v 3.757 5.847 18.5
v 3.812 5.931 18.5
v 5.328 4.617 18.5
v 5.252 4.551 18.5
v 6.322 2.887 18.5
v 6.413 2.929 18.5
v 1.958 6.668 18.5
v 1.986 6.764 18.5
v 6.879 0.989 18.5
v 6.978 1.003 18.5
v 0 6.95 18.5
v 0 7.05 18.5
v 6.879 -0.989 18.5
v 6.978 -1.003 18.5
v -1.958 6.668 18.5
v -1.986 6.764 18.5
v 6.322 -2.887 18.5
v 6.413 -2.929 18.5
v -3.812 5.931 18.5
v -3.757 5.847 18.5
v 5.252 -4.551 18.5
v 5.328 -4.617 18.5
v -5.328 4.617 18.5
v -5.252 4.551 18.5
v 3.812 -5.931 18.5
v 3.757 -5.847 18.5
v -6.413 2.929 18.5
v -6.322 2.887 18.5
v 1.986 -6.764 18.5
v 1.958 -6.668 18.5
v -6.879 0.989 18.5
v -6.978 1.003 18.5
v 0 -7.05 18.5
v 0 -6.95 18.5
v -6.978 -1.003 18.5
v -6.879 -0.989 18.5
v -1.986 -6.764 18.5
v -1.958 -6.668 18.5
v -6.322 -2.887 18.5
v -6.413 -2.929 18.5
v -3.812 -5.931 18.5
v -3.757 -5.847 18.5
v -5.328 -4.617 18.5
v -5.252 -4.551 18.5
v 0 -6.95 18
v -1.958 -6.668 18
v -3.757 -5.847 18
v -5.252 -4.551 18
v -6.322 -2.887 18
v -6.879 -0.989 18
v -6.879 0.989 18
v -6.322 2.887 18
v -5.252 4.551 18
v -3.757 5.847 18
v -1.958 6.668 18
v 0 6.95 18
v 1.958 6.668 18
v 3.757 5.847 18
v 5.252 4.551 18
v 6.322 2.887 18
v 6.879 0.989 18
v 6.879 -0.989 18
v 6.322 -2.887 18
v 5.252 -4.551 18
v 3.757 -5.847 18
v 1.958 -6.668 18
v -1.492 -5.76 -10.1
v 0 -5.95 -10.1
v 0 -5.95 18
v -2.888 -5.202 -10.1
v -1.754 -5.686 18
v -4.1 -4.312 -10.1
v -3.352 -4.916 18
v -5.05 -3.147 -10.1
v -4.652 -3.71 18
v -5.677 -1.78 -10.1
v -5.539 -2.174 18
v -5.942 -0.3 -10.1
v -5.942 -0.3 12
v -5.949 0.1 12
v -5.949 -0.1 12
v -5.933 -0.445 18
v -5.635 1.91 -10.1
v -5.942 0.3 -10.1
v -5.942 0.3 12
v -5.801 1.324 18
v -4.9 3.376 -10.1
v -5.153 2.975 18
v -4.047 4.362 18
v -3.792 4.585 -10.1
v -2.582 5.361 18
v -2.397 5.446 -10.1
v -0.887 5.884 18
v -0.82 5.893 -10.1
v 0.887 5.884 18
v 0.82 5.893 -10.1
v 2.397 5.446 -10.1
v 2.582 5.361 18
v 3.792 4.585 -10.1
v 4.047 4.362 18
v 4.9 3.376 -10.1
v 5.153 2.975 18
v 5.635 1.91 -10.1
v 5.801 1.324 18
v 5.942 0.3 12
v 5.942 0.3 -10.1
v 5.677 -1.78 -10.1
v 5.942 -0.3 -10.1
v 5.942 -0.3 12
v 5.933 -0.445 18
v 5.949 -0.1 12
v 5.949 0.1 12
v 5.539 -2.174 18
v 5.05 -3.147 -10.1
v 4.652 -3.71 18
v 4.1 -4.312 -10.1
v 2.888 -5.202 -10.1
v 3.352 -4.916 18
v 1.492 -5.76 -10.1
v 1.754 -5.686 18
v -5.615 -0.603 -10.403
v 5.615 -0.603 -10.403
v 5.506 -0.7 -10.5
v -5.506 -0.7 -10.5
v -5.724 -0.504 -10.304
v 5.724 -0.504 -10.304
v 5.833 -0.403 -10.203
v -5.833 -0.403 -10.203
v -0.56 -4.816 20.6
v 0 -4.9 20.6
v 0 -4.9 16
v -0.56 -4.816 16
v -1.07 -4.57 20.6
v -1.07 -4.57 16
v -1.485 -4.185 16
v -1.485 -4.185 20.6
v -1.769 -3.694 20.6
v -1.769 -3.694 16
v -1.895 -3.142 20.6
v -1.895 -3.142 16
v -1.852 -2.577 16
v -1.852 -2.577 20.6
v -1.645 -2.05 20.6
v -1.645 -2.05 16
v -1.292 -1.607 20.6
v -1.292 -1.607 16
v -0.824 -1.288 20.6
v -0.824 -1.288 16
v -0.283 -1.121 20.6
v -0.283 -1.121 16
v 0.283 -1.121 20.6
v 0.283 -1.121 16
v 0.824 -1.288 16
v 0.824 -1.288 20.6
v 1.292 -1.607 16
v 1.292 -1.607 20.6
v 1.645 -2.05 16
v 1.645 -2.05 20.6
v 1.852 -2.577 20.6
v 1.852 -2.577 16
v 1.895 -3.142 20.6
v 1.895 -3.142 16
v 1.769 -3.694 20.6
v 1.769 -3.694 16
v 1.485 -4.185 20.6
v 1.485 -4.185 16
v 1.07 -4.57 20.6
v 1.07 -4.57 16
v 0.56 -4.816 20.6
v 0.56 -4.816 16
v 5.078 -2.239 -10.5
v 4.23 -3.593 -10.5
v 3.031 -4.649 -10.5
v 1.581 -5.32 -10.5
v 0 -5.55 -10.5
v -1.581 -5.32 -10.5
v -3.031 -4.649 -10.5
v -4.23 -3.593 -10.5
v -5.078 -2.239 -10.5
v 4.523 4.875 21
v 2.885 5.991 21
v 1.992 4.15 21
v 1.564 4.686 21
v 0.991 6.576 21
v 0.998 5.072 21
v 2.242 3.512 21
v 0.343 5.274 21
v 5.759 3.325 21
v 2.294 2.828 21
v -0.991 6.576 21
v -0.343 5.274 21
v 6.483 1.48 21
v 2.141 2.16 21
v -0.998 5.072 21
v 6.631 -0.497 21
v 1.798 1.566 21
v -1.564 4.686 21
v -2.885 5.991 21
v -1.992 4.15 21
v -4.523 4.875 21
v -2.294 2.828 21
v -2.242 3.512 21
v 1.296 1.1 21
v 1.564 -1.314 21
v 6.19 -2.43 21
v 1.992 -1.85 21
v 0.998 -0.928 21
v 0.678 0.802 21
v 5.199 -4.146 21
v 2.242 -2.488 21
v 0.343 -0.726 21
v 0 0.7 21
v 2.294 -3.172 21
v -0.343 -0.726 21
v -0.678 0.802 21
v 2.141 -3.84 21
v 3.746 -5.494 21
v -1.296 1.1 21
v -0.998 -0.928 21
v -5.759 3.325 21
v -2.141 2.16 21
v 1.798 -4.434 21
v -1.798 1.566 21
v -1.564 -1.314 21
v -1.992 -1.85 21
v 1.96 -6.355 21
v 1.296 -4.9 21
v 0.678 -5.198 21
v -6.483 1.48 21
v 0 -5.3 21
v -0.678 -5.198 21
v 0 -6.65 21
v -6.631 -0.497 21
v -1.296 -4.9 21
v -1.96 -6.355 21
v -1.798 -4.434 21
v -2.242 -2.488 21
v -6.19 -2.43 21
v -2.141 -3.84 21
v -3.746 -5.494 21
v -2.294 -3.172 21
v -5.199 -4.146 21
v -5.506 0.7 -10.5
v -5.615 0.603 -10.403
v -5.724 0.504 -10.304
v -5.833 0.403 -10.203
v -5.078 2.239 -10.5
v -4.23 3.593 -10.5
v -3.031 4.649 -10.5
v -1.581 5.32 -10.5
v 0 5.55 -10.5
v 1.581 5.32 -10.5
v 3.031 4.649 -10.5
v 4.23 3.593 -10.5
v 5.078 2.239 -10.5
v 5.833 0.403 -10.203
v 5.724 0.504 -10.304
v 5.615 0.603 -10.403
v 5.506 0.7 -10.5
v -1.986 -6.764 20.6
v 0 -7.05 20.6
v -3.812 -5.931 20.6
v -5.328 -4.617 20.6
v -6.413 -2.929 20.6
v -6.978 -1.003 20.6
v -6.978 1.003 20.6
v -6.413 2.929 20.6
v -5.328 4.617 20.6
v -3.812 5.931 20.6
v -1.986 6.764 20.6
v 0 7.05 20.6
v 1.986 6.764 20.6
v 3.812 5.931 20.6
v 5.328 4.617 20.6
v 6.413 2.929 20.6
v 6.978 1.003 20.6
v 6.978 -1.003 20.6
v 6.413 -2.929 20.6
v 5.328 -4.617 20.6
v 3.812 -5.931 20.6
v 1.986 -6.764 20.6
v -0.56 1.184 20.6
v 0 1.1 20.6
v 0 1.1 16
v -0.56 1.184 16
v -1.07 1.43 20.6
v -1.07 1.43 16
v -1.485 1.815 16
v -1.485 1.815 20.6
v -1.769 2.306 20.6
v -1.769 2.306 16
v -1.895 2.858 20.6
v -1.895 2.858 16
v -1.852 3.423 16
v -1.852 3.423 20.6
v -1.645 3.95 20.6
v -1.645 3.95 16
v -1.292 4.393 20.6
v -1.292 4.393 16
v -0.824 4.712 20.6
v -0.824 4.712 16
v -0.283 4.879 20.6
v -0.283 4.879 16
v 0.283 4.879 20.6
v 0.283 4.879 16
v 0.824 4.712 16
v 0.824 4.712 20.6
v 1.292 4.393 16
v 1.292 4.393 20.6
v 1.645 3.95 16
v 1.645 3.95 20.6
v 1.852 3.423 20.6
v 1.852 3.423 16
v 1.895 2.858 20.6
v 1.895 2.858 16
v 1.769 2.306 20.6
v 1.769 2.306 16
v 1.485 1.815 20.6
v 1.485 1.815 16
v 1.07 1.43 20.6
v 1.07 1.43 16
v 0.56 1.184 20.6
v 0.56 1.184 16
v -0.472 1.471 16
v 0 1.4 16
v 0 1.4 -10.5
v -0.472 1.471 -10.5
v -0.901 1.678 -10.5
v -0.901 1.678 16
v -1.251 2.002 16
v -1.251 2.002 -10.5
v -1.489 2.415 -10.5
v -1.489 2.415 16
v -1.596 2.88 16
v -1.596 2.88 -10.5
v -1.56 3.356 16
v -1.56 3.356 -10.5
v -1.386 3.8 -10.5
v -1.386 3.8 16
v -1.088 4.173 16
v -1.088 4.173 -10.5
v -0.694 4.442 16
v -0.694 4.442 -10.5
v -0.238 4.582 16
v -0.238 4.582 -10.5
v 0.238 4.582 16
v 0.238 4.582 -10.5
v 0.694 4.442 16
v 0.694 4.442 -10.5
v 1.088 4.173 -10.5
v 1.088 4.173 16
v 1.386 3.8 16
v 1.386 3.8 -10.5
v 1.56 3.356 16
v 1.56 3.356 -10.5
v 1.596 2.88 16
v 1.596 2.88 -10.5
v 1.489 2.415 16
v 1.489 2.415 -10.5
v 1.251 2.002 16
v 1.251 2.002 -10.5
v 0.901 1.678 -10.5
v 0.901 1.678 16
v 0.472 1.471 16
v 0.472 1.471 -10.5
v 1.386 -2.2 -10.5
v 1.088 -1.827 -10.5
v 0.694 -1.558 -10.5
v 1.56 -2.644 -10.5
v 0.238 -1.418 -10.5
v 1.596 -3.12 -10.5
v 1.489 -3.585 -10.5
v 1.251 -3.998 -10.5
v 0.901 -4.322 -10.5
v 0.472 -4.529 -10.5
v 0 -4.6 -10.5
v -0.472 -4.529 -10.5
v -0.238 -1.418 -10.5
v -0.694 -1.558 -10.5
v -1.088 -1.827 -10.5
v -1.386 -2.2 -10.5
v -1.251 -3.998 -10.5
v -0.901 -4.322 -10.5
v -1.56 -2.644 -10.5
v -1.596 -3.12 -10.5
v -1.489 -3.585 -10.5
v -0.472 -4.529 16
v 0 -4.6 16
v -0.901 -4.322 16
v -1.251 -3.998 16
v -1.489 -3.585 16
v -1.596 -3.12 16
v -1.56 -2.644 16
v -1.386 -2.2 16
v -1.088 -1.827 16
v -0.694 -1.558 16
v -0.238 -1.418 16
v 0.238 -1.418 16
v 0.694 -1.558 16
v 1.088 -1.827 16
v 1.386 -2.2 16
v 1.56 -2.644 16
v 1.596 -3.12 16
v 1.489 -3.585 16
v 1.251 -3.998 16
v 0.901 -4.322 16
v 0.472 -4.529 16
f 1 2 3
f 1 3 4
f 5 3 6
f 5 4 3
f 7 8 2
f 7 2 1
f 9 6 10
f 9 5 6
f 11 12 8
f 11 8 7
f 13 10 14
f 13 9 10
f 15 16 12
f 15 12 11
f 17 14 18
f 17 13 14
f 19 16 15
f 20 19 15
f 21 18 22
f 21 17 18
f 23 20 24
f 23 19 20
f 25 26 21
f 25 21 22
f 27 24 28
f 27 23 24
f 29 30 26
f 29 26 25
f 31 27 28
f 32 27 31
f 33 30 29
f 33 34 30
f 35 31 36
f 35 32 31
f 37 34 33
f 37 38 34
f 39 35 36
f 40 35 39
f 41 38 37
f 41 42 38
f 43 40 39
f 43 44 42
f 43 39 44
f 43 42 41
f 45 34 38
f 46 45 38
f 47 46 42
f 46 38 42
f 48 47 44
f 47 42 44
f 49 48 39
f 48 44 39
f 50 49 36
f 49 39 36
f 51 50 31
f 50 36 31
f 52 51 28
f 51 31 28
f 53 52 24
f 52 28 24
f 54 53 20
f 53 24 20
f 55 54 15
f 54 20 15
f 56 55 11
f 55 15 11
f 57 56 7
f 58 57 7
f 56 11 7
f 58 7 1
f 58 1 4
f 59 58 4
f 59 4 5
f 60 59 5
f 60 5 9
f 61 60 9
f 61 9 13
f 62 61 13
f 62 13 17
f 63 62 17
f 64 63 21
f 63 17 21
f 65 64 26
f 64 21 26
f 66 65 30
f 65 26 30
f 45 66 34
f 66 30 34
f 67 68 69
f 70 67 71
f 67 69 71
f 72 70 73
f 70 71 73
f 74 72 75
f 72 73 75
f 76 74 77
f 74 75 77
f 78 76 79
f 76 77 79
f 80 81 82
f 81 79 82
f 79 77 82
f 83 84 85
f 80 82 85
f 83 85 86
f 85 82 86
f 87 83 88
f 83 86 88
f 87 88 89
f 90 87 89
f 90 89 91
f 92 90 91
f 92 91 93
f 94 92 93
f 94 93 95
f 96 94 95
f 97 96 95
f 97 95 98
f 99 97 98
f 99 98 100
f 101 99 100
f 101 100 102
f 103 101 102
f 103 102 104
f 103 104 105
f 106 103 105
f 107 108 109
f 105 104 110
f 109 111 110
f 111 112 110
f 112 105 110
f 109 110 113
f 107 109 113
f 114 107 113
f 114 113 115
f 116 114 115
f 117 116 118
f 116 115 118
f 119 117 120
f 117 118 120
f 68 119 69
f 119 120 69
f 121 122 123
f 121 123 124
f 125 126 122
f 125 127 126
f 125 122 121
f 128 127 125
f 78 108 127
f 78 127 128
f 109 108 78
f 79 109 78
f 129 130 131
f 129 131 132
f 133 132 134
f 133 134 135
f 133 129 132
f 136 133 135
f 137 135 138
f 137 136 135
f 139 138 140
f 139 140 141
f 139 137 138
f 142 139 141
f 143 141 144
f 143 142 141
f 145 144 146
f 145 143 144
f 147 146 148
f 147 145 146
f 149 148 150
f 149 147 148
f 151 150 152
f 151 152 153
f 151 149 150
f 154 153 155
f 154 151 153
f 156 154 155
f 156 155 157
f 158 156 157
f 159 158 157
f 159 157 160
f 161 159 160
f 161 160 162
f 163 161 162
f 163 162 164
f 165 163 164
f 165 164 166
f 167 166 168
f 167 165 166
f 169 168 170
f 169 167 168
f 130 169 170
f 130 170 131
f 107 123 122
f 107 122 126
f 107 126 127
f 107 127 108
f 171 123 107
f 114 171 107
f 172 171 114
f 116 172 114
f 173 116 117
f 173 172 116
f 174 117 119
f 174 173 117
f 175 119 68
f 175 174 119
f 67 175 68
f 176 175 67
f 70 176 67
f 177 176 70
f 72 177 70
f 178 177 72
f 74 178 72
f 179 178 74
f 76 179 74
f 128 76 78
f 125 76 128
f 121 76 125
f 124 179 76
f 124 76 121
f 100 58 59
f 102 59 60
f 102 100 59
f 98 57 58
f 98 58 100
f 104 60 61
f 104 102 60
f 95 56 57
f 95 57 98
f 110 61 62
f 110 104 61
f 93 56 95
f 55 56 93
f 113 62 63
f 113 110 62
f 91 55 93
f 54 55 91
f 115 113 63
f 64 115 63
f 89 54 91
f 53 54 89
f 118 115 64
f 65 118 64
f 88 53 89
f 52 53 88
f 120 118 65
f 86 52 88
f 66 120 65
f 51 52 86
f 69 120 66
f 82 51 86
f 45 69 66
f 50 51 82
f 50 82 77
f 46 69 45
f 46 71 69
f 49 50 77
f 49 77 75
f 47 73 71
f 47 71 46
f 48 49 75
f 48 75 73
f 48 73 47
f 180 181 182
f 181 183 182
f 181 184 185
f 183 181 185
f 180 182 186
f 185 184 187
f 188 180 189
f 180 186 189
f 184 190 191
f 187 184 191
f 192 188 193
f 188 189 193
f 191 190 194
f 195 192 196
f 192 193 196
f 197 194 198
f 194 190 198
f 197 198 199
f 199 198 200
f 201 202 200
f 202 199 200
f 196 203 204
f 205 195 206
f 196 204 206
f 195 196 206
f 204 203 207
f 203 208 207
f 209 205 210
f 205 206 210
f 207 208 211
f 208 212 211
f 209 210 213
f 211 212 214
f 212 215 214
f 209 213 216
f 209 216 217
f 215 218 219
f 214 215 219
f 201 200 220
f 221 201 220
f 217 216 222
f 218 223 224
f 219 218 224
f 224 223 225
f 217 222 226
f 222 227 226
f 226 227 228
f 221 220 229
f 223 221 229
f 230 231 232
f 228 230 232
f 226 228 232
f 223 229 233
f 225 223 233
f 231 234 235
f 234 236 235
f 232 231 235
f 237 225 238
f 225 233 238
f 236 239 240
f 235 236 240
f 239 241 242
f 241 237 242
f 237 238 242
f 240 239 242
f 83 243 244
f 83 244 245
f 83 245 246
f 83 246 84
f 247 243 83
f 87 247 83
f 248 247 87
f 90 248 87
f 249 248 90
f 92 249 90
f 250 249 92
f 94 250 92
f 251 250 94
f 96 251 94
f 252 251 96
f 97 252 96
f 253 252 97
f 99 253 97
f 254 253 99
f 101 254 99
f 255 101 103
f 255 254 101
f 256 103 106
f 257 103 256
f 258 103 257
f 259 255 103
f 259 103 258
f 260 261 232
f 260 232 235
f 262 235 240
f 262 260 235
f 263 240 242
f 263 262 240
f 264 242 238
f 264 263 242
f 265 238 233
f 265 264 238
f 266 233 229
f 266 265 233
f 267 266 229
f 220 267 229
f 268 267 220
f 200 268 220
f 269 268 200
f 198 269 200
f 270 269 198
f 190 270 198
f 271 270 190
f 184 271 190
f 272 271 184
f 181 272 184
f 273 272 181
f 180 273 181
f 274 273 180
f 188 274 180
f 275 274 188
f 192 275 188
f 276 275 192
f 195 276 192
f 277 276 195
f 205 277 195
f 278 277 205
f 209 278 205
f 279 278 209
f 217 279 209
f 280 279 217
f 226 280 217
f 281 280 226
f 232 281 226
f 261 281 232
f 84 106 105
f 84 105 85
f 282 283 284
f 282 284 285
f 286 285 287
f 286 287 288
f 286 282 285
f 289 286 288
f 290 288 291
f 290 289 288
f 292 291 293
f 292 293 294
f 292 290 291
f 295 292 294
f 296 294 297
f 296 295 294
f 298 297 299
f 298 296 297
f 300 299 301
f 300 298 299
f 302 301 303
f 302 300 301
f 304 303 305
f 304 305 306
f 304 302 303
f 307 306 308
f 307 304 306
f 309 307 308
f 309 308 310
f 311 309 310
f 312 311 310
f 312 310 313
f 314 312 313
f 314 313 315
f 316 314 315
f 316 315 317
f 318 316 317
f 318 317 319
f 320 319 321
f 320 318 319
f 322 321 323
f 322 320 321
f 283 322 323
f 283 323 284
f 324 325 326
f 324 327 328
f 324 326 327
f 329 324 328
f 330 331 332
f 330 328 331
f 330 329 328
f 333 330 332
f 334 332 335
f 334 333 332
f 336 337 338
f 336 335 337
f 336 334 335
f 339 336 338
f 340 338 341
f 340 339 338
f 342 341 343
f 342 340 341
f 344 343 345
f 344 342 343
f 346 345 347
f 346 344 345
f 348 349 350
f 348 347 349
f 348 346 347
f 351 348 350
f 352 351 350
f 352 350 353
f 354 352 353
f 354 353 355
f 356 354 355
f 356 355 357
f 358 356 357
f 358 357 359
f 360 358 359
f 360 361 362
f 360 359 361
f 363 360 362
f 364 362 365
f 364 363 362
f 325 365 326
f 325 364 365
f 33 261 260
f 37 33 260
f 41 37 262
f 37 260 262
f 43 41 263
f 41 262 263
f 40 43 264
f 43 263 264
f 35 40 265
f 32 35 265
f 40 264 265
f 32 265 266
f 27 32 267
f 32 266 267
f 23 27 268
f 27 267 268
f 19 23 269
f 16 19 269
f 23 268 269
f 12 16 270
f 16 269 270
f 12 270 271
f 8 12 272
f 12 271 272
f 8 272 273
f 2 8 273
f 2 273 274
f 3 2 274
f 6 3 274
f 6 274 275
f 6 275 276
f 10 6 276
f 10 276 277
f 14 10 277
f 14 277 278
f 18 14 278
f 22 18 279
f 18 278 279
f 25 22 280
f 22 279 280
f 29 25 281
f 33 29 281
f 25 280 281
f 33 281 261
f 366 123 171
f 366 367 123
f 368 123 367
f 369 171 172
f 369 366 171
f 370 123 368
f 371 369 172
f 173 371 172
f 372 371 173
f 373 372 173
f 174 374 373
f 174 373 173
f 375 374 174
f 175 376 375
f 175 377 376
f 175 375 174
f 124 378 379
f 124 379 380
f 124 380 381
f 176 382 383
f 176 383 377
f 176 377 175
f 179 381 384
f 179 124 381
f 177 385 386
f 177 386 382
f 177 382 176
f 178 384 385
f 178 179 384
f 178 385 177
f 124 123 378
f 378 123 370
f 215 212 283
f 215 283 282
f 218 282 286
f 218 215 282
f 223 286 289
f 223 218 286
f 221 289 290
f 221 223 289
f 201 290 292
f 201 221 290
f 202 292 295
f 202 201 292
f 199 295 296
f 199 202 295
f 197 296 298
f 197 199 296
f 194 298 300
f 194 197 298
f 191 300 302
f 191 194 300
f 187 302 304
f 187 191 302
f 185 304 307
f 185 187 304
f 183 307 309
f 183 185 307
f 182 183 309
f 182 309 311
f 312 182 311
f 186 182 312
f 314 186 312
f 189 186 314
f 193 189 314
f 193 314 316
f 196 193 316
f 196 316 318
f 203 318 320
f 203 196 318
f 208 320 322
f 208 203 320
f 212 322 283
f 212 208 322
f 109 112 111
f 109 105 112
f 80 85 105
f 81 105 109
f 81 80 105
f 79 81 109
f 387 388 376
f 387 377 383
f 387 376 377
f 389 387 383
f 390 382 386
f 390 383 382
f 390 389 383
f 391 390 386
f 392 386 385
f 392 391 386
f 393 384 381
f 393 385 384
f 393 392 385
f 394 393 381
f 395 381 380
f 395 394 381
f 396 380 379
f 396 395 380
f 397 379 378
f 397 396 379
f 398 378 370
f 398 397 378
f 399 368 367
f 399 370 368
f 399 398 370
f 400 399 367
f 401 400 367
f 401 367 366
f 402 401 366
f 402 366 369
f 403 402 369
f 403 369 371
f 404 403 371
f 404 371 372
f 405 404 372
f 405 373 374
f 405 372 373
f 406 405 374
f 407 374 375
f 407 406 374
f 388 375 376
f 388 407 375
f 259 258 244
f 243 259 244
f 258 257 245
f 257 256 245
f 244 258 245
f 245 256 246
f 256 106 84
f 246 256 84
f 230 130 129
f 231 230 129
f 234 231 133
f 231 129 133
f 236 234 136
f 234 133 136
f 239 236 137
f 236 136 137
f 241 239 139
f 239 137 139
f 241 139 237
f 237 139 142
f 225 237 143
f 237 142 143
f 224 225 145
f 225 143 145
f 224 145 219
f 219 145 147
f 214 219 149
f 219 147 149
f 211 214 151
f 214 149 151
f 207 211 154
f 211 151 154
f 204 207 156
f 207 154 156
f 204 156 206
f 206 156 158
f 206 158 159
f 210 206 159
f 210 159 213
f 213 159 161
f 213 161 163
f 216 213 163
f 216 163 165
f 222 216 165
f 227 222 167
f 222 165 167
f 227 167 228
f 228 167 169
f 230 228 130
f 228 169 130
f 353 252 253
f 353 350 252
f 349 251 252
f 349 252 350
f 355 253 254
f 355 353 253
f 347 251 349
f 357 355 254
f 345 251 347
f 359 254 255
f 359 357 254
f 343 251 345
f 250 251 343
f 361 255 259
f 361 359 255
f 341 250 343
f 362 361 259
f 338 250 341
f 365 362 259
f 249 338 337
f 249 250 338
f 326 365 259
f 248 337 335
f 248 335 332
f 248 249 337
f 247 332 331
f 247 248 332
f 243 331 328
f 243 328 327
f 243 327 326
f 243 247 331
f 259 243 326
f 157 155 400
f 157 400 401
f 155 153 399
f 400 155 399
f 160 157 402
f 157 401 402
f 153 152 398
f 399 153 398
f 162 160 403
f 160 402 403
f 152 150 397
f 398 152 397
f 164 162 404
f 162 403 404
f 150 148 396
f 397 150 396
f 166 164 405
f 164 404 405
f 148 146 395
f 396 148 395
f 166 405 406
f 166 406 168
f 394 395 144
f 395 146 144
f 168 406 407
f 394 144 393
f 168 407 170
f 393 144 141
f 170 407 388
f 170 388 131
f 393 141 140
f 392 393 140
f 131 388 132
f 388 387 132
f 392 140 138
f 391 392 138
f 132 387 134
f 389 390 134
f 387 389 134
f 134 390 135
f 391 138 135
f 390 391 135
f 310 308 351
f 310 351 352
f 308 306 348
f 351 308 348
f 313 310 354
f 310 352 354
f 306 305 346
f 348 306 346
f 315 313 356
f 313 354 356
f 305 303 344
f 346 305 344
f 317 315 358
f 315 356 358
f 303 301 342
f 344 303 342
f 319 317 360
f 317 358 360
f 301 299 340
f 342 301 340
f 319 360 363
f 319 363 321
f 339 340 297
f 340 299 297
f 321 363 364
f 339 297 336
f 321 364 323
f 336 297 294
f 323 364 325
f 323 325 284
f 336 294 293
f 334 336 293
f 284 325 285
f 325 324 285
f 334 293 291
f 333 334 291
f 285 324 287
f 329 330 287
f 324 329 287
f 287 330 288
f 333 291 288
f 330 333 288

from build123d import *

# Parameters (mm, degrees)
SKETCH014_R             = 7.05
PAD004_DEPTH            = 2.5
SKETCH015_R             = 6.95
PAD005_DEPTH            = 0.5
SKETCH016_R             = 5.95
PAD006_DEPTH            = 28.5
SKETCH018_R             = 1.9
POCKET010_DEPTH         = 5
SKETCH019_R             = 1.6
POCKET011_DEPTH         = 31.501
SKETCH020_W             = 0.6
SKETCH020_H             = 16
POCKET012_DEPTH         = 34
CHAMFER_SIZE            = 0.4
CHAMFER003_SIZE         = 0.4
BODY003_ROLL_ANGLE      = 180
BODY003_PLACEMENT_ANGLE = -90


with BuildPart() as part:
    # Sketch014 → Pad004 (new body)
    with BuildSketch(Plane.XY):
        Circle(SKETCH014_R)
    extrude(amount=PAD004_DEPTH)

    # Sketch015 (on DatumPlane) → Pad005 (join)
    with BuildSketch(Plane.XY.offset(2.5)):
        Circle(SKETCH015_R)
    extrude(amount=PAD005_DEPTH)

    # Sketch016 (on DatumPlane) → Pad006 (join)
    with BuildSketch(Plane.XY.offset(3)):
        Circle(SKETCH016_R)
    extrude(amount=PAD006_DEPTH)

    # Sketch018 (on DatumPlane) → Pocket010 (cut)
    with BuildSketch(Plane.XY):
        with Locations((-3, 0)):
            Circle(SKETCH018_R)
        with Locations((3, 0)):
            Circle(SKETCH018_R)
    extrude(amount=POCKET010_DEPTH, mode=Mode.SUBTRACT)

    # Sketch019 (on DatumPlane) → Pocket011 (cut, through all)
    with BuildSketch(Plane.XY):
        with Locations((-3, 0)):
            Circle(SKETCH019_R)
        with Locations((3, 0)):
            Circle(SKETCH019_R)
    extrude(amount=POCKET011_DEPTH, mode=Mode.SUBTRACT)

    # Sketch020 (on DatumPlane) → Pocket012 (cut)
    with BuildSketch(Plane.XY.offset(43)):
        Rectangle(SKETCH020_W, SKETCH020_H)
    extrude(amount=-POCKET012_DEPTH, mode=Mode.SUBTRACT)

    # Chamfer
    chamfer_edges = [part.edges().sort_by_distance(p)[0] for p in [
        (-0.3, 0, 31.5),
        (-5.95, 0, 31.5),
        (0.3, 0, 31.5),
        (4.312047, -4.099848, 31.5),
        (4.312047, 4.099848, 31.5),
    ]]
    chamfer(chamfer_edges, length=CHAMFER_SIZE)

    # Chamfer003
    chamfer003_edges = [part.edges().sort_by_distance(p)[0] for p in [
        (-7.05, 0, 0),
        (-4.9, 0, 0),
        (1.1, 0, 0),
    ]]
    chamfer(chamfer003_edges, length=CHAMFER003_SIZE)


with BuildPart() as part_1:
    # Body003 roll: moved
    add(part.part.rotate(Axis((0, 0, 0), (1, 0, 0)), BODY003_ROLL_ANGLE))


with BuildPart() as part_2:
    # Body003 placement: moved
    add(part_1.part.moved(Location((0, 0, 21))).rotate(Axis((0, 0, 21), (0, 0, 1)), BODY003_PLACEMENT_ANGLE))


solid = part_2.part
